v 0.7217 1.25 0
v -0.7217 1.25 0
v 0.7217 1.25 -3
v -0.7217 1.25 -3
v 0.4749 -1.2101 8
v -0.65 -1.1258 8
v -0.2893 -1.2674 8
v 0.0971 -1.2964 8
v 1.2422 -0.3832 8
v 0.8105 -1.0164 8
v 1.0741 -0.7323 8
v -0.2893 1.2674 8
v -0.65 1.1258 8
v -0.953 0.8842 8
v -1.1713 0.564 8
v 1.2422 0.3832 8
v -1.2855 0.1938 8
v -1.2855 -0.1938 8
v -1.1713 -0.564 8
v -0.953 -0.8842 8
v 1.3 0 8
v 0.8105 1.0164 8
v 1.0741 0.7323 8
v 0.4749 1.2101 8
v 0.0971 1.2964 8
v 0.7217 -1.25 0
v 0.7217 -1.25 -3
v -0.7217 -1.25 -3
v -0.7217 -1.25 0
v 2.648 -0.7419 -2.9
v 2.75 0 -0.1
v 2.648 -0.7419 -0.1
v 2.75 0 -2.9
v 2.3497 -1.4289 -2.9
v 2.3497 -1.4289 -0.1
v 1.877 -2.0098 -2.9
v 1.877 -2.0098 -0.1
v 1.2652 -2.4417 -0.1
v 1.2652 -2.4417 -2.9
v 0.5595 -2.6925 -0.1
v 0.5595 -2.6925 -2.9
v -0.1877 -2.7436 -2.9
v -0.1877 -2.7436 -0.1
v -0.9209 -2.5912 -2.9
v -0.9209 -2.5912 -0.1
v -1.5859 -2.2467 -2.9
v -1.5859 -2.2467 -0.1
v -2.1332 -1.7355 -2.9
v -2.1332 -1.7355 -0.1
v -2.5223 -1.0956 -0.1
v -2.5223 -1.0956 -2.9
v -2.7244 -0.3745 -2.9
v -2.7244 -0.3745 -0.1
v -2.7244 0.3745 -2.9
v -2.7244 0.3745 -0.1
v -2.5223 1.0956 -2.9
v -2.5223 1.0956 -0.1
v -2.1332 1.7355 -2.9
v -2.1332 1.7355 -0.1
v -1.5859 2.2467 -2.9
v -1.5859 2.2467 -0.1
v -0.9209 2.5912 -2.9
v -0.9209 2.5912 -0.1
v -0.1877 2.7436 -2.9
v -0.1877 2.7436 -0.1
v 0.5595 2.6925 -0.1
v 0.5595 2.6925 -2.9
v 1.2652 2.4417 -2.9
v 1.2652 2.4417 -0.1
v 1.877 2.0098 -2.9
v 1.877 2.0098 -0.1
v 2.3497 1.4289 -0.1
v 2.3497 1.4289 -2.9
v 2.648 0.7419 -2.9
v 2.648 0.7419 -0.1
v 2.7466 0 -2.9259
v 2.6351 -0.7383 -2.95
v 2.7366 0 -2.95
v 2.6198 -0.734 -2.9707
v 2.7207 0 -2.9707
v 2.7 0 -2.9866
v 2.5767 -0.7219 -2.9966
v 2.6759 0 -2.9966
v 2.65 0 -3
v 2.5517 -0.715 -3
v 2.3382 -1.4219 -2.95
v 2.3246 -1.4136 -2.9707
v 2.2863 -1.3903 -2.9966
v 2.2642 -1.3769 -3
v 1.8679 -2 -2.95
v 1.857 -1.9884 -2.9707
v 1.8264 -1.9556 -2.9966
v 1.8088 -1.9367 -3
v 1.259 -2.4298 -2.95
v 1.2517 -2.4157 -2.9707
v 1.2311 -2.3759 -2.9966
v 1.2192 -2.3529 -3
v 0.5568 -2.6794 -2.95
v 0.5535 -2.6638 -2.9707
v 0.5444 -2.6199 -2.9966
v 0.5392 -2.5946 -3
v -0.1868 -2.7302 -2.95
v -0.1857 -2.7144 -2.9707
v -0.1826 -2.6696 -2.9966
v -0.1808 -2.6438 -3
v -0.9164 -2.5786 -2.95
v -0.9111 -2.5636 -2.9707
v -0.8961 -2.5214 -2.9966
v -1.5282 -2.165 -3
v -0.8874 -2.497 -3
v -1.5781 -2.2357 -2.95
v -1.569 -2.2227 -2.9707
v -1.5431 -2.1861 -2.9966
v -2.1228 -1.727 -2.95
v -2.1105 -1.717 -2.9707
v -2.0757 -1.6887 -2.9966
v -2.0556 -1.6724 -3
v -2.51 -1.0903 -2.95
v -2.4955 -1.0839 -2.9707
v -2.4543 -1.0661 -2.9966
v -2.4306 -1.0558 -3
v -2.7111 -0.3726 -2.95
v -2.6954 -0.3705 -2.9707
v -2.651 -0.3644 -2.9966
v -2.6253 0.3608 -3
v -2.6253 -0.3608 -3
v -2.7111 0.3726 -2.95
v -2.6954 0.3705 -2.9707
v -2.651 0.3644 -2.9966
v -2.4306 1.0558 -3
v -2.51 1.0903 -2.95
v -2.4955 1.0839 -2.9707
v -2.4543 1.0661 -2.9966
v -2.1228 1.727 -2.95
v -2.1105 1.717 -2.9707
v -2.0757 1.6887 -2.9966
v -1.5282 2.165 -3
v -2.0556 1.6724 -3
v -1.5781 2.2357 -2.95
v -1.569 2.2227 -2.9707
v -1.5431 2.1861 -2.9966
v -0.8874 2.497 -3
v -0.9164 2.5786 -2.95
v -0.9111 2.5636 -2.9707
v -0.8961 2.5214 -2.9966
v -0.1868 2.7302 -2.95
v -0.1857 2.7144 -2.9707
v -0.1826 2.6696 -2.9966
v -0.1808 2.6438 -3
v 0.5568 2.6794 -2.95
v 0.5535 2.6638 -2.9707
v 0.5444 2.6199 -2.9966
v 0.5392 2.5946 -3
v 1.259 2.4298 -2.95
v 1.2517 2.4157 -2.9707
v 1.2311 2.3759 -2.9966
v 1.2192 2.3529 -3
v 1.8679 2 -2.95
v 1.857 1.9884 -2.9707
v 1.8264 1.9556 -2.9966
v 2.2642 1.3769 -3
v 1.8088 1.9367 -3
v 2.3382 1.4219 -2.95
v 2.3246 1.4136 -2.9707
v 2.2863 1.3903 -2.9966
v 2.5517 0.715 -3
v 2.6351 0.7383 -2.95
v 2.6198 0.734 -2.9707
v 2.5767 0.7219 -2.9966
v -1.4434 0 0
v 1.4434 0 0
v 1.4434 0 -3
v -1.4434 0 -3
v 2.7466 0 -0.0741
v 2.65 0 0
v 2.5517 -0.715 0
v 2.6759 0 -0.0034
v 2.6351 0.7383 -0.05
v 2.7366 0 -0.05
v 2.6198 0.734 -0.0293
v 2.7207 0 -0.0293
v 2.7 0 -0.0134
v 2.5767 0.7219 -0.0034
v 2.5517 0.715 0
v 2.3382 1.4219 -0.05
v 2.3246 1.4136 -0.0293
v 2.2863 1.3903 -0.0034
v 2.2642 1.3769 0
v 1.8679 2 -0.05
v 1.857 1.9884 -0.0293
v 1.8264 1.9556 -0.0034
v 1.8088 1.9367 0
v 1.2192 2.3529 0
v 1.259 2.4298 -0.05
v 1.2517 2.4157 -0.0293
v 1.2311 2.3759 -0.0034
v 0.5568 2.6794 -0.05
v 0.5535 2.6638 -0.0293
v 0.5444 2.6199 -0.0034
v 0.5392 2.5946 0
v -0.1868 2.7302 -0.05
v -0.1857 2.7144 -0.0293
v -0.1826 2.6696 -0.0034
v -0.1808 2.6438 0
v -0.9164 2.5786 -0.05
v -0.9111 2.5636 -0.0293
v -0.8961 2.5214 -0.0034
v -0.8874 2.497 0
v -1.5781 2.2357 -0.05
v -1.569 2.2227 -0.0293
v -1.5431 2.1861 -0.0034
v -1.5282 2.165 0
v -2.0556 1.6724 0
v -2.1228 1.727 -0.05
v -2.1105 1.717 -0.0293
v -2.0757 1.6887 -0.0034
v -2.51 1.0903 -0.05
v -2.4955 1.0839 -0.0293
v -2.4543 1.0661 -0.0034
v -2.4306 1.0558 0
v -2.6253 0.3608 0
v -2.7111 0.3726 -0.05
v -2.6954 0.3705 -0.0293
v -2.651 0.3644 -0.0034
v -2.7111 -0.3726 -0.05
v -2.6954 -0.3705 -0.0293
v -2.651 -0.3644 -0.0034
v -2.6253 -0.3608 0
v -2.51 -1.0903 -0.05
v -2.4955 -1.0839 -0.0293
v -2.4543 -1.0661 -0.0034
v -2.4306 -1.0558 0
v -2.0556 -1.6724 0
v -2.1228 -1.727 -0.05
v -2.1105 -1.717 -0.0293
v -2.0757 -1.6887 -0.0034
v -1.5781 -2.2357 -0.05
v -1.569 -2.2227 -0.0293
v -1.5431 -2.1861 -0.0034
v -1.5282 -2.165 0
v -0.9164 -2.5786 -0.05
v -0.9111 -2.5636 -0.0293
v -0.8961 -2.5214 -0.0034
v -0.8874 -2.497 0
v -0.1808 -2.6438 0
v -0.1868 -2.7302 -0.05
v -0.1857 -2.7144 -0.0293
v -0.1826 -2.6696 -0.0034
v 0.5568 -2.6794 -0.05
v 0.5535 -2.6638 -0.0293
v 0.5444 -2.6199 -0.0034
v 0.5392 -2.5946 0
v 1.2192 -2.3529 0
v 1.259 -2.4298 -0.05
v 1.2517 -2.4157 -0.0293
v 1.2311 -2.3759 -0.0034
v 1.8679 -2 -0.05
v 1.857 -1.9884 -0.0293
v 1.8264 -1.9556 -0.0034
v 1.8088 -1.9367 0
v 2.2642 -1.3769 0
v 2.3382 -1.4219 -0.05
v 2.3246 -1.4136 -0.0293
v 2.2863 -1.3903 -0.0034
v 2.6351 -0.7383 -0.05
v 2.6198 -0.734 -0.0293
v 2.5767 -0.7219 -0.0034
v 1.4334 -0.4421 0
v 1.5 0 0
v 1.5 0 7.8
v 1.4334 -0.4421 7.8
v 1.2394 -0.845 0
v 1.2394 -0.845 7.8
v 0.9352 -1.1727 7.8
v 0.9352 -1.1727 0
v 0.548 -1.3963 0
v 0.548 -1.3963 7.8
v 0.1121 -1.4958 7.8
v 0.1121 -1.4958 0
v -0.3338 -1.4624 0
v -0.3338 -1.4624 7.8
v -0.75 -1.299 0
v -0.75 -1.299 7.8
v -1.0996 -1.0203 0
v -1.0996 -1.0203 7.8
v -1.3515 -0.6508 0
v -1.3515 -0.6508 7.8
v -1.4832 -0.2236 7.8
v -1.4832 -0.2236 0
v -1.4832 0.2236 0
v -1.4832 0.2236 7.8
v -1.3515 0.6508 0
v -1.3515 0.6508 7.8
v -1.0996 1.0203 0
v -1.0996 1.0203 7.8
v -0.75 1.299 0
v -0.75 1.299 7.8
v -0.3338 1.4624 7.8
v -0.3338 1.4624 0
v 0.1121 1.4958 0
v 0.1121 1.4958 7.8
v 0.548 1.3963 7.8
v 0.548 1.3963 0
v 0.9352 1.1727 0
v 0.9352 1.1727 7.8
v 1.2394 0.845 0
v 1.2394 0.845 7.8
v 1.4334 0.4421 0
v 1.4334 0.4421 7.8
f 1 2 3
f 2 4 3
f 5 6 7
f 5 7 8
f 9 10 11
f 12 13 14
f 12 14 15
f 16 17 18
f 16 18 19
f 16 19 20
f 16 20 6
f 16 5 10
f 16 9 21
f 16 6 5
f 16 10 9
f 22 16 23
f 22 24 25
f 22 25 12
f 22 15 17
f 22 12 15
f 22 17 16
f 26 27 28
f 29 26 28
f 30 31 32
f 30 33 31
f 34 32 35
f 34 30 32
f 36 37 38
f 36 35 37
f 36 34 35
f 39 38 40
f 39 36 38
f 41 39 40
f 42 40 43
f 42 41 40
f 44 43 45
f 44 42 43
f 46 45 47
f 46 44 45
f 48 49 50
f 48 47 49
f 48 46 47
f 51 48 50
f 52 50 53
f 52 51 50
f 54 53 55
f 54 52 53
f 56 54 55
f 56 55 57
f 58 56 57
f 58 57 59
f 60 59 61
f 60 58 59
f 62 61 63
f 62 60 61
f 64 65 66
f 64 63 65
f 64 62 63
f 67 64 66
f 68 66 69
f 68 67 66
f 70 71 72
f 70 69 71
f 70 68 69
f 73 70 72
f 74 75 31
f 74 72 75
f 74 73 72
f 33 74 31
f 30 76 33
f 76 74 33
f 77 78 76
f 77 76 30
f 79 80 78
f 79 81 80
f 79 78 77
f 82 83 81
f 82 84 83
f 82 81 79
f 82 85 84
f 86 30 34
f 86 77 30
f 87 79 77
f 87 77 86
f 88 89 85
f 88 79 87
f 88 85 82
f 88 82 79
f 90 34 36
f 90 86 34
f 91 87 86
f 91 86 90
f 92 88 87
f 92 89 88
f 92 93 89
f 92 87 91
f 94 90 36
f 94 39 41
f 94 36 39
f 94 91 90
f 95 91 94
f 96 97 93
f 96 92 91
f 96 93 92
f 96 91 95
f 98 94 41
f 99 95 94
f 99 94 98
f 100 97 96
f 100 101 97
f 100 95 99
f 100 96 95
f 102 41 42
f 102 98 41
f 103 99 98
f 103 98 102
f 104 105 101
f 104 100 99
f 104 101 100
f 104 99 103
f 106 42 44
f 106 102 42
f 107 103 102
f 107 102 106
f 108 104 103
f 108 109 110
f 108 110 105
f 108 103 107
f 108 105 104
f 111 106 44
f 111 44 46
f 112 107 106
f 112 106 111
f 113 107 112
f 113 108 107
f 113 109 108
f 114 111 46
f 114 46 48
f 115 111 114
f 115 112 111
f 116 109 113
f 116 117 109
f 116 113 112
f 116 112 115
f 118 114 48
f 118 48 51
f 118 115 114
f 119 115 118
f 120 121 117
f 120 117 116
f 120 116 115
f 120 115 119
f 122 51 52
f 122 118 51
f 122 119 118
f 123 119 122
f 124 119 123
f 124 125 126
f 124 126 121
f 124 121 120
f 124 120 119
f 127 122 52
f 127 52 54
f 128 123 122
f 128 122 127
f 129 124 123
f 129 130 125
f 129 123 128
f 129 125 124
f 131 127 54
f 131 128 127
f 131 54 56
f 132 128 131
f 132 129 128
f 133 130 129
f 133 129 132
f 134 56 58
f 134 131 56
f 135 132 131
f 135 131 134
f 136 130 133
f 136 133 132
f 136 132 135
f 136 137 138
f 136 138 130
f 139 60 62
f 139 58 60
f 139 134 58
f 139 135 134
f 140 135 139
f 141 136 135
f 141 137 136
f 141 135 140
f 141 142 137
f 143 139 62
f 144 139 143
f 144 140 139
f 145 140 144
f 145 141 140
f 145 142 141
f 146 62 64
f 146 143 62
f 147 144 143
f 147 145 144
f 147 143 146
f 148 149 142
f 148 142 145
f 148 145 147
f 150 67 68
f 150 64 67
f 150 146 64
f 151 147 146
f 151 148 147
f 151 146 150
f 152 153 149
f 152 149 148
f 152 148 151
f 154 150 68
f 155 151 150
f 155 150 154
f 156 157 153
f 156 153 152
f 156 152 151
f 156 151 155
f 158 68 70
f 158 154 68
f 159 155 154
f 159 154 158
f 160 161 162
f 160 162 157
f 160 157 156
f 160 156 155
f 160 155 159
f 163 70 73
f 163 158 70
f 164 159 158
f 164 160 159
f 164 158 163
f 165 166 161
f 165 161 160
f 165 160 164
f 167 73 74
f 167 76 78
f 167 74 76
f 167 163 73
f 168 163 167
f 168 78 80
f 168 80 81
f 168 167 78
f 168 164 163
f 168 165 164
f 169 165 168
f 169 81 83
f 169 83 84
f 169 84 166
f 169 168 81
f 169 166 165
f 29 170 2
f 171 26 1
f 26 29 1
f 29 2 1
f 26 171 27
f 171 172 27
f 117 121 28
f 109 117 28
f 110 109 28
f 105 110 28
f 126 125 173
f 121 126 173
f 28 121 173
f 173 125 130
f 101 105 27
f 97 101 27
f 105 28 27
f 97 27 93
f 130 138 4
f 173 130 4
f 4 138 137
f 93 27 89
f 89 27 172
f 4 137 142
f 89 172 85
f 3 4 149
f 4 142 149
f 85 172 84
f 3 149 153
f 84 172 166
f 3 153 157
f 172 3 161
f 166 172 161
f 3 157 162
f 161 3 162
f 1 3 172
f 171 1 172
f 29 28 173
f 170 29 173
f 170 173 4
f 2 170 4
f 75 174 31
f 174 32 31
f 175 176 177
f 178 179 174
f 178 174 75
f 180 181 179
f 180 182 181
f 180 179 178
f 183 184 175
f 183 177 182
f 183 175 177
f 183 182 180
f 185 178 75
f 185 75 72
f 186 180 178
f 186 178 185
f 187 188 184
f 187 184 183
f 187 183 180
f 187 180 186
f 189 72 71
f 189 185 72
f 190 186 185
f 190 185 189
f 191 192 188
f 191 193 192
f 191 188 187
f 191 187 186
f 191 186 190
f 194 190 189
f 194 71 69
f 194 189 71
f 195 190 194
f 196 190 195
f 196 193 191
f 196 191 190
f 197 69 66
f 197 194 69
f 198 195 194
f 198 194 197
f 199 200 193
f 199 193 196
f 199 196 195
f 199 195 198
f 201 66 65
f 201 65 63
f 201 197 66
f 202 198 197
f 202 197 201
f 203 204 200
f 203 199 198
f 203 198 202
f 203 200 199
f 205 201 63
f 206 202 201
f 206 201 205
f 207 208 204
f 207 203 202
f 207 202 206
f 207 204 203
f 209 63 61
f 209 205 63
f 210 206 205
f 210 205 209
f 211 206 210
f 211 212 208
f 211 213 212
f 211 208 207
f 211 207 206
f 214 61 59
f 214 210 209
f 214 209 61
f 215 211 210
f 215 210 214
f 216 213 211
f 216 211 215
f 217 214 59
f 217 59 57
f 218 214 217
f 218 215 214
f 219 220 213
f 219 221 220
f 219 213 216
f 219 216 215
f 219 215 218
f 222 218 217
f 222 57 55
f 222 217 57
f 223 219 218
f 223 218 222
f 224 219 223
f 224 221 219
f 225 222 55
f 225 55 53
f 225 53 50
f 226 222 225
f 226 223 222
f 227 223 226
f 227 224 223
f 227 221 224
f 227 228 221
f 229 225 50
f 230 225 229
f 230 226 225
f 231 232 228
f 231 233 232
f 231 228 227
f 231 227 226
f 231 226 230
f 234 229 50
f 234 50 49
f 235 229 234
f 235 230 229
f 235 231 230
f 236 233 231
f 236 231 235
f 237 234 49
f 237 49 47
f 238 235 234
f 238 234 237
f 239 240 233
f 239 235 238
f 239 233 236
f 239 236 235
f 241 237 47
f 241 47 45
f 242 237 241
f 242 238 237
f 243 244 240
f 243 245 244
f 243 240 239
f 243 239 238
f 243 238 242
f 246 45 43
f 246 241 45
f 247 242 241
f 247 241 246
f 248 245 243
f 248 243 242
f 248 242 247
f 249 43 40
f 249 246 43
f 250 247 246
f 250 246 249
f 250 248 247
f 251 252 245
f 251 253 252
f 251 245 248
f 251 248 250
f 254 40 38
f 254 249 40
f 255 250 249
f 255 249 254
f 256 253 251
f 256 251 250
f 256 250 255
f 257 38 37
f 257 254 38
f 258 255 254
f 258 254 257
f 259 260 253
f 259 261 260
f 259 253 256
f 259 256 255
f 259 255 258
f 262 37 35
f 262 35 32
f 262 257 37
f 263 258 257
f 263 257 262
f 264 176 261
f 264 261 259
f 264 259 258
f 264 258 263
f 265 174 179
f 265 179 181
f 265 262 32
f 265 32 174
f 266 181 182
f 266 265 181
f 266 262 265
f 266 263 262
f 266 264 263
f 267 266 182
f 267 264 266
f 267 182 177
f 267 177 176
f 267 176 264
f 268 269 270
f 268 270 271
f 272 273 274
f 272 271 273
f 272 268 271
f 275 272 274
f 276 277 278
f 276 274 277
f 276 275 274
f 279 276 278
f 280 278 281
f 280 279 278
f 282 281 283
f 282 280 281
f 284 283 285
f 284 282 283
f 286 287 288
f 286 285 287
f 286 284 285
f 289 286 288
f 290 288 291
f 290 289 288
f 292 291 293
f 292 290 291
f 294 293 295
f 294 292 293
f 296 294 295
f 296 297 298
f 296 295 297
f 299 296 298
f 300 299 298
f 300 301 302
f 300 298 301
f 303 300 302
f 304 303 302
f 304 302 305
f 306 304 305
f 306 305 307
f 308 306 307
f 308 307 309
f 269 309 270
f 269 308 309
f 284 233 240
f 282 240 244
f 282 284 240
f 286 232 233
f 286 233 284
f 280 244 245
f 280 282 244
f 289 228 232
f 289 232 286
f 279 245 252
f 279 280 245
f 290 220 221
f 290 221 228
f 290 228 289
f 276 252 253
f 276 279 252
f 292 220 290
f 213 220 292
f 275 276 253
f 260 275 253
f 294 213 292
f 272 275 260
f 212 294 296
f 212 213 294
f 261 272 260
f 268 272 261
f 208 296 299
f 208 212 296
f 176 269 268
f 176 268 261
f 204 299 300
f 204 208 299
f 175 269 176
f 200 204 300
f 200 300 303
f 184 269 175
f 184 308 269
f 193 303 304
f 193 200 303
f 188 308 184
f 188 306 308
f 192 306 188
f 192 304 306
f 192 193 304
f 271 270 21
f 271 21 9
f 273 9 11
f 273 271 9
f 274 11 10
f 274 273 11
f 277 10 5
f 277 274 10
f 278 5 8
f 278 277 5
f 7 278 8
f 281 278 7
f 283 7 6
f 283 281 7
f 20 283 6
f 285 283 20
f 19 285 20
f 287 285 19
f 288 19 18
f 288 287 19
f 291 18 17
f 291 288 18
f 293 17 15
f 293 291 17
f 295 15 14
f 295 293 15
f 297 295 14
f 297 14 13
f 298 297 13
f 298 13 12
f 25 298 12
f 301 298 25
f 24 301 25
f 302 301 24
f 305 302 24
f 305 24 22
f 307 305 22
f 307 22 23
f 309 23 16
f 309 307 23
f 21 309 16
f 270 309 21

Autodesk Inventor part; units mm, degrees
ref_plane "YZ Plane" through (0, 0, 0) normal (1, 0, 0) x (0, 1, 0)
ref_plane "XZ Plane" through (0, 0, 0) normal (0, 1, 0) x (-1, 0, 0)
ref_plane "Work Plane1" through (0, 0, -3) normal (0, 0, 1) x (1, 0, 0)
sketch "Sketch1" plane through (0, 0, -3) normal (0, 0, 1) x (1, 0, 0)
  circle A0 centre (0, 0) radius 2.75
extrude "Extrusion3" add sketch "Sketch1" along normal blind 3
fillet "Fillet1" radius 0.1 2 edges at (-2.75, 0, -3) (-2.75, 0, 0)
sketch "Sketch2" plane through (0, 0, -3) normal (0, 0, 1) x (1, 0, 0)
  line L0 (-0.7217, 1.25) -> (0.7217, 1.25)
  line L1 (0.7217, -1.25) -> (-0.7217, -1.25)
  line L2 (-0.7217, -1.25) -> (-1.4434, 0)
  line L3 (0.7217, 1.25) -> (1.4434, 0)
  line L4 (-1.4434, 0) -> (-0.7217, 1.25)
  line L5 (1.4434, 0) -> (0.7217, -1.25)
extrude "Extrusion2" cut sketch "Sketch2" along normal blind 3
sketch "Sketch3" plane through (0, 0, 0) normal (0, 0, 1) x (1, 0, 0)
  circle A0 centre (0, 0) radius 1.5
extrude "Extrusion1" add sketch "Sketch3" along normal blind 8
chamfer "Chamfer1" distance 0.2 angle 45 1 edges at (-1.5, 0, 8)
thread "Thread1" size "M3x0.5" class "6g" standard "ANSI Metric M Profile" full length
properties part number "DIN 912 M3 8 mm" material "Stainless Steel"
